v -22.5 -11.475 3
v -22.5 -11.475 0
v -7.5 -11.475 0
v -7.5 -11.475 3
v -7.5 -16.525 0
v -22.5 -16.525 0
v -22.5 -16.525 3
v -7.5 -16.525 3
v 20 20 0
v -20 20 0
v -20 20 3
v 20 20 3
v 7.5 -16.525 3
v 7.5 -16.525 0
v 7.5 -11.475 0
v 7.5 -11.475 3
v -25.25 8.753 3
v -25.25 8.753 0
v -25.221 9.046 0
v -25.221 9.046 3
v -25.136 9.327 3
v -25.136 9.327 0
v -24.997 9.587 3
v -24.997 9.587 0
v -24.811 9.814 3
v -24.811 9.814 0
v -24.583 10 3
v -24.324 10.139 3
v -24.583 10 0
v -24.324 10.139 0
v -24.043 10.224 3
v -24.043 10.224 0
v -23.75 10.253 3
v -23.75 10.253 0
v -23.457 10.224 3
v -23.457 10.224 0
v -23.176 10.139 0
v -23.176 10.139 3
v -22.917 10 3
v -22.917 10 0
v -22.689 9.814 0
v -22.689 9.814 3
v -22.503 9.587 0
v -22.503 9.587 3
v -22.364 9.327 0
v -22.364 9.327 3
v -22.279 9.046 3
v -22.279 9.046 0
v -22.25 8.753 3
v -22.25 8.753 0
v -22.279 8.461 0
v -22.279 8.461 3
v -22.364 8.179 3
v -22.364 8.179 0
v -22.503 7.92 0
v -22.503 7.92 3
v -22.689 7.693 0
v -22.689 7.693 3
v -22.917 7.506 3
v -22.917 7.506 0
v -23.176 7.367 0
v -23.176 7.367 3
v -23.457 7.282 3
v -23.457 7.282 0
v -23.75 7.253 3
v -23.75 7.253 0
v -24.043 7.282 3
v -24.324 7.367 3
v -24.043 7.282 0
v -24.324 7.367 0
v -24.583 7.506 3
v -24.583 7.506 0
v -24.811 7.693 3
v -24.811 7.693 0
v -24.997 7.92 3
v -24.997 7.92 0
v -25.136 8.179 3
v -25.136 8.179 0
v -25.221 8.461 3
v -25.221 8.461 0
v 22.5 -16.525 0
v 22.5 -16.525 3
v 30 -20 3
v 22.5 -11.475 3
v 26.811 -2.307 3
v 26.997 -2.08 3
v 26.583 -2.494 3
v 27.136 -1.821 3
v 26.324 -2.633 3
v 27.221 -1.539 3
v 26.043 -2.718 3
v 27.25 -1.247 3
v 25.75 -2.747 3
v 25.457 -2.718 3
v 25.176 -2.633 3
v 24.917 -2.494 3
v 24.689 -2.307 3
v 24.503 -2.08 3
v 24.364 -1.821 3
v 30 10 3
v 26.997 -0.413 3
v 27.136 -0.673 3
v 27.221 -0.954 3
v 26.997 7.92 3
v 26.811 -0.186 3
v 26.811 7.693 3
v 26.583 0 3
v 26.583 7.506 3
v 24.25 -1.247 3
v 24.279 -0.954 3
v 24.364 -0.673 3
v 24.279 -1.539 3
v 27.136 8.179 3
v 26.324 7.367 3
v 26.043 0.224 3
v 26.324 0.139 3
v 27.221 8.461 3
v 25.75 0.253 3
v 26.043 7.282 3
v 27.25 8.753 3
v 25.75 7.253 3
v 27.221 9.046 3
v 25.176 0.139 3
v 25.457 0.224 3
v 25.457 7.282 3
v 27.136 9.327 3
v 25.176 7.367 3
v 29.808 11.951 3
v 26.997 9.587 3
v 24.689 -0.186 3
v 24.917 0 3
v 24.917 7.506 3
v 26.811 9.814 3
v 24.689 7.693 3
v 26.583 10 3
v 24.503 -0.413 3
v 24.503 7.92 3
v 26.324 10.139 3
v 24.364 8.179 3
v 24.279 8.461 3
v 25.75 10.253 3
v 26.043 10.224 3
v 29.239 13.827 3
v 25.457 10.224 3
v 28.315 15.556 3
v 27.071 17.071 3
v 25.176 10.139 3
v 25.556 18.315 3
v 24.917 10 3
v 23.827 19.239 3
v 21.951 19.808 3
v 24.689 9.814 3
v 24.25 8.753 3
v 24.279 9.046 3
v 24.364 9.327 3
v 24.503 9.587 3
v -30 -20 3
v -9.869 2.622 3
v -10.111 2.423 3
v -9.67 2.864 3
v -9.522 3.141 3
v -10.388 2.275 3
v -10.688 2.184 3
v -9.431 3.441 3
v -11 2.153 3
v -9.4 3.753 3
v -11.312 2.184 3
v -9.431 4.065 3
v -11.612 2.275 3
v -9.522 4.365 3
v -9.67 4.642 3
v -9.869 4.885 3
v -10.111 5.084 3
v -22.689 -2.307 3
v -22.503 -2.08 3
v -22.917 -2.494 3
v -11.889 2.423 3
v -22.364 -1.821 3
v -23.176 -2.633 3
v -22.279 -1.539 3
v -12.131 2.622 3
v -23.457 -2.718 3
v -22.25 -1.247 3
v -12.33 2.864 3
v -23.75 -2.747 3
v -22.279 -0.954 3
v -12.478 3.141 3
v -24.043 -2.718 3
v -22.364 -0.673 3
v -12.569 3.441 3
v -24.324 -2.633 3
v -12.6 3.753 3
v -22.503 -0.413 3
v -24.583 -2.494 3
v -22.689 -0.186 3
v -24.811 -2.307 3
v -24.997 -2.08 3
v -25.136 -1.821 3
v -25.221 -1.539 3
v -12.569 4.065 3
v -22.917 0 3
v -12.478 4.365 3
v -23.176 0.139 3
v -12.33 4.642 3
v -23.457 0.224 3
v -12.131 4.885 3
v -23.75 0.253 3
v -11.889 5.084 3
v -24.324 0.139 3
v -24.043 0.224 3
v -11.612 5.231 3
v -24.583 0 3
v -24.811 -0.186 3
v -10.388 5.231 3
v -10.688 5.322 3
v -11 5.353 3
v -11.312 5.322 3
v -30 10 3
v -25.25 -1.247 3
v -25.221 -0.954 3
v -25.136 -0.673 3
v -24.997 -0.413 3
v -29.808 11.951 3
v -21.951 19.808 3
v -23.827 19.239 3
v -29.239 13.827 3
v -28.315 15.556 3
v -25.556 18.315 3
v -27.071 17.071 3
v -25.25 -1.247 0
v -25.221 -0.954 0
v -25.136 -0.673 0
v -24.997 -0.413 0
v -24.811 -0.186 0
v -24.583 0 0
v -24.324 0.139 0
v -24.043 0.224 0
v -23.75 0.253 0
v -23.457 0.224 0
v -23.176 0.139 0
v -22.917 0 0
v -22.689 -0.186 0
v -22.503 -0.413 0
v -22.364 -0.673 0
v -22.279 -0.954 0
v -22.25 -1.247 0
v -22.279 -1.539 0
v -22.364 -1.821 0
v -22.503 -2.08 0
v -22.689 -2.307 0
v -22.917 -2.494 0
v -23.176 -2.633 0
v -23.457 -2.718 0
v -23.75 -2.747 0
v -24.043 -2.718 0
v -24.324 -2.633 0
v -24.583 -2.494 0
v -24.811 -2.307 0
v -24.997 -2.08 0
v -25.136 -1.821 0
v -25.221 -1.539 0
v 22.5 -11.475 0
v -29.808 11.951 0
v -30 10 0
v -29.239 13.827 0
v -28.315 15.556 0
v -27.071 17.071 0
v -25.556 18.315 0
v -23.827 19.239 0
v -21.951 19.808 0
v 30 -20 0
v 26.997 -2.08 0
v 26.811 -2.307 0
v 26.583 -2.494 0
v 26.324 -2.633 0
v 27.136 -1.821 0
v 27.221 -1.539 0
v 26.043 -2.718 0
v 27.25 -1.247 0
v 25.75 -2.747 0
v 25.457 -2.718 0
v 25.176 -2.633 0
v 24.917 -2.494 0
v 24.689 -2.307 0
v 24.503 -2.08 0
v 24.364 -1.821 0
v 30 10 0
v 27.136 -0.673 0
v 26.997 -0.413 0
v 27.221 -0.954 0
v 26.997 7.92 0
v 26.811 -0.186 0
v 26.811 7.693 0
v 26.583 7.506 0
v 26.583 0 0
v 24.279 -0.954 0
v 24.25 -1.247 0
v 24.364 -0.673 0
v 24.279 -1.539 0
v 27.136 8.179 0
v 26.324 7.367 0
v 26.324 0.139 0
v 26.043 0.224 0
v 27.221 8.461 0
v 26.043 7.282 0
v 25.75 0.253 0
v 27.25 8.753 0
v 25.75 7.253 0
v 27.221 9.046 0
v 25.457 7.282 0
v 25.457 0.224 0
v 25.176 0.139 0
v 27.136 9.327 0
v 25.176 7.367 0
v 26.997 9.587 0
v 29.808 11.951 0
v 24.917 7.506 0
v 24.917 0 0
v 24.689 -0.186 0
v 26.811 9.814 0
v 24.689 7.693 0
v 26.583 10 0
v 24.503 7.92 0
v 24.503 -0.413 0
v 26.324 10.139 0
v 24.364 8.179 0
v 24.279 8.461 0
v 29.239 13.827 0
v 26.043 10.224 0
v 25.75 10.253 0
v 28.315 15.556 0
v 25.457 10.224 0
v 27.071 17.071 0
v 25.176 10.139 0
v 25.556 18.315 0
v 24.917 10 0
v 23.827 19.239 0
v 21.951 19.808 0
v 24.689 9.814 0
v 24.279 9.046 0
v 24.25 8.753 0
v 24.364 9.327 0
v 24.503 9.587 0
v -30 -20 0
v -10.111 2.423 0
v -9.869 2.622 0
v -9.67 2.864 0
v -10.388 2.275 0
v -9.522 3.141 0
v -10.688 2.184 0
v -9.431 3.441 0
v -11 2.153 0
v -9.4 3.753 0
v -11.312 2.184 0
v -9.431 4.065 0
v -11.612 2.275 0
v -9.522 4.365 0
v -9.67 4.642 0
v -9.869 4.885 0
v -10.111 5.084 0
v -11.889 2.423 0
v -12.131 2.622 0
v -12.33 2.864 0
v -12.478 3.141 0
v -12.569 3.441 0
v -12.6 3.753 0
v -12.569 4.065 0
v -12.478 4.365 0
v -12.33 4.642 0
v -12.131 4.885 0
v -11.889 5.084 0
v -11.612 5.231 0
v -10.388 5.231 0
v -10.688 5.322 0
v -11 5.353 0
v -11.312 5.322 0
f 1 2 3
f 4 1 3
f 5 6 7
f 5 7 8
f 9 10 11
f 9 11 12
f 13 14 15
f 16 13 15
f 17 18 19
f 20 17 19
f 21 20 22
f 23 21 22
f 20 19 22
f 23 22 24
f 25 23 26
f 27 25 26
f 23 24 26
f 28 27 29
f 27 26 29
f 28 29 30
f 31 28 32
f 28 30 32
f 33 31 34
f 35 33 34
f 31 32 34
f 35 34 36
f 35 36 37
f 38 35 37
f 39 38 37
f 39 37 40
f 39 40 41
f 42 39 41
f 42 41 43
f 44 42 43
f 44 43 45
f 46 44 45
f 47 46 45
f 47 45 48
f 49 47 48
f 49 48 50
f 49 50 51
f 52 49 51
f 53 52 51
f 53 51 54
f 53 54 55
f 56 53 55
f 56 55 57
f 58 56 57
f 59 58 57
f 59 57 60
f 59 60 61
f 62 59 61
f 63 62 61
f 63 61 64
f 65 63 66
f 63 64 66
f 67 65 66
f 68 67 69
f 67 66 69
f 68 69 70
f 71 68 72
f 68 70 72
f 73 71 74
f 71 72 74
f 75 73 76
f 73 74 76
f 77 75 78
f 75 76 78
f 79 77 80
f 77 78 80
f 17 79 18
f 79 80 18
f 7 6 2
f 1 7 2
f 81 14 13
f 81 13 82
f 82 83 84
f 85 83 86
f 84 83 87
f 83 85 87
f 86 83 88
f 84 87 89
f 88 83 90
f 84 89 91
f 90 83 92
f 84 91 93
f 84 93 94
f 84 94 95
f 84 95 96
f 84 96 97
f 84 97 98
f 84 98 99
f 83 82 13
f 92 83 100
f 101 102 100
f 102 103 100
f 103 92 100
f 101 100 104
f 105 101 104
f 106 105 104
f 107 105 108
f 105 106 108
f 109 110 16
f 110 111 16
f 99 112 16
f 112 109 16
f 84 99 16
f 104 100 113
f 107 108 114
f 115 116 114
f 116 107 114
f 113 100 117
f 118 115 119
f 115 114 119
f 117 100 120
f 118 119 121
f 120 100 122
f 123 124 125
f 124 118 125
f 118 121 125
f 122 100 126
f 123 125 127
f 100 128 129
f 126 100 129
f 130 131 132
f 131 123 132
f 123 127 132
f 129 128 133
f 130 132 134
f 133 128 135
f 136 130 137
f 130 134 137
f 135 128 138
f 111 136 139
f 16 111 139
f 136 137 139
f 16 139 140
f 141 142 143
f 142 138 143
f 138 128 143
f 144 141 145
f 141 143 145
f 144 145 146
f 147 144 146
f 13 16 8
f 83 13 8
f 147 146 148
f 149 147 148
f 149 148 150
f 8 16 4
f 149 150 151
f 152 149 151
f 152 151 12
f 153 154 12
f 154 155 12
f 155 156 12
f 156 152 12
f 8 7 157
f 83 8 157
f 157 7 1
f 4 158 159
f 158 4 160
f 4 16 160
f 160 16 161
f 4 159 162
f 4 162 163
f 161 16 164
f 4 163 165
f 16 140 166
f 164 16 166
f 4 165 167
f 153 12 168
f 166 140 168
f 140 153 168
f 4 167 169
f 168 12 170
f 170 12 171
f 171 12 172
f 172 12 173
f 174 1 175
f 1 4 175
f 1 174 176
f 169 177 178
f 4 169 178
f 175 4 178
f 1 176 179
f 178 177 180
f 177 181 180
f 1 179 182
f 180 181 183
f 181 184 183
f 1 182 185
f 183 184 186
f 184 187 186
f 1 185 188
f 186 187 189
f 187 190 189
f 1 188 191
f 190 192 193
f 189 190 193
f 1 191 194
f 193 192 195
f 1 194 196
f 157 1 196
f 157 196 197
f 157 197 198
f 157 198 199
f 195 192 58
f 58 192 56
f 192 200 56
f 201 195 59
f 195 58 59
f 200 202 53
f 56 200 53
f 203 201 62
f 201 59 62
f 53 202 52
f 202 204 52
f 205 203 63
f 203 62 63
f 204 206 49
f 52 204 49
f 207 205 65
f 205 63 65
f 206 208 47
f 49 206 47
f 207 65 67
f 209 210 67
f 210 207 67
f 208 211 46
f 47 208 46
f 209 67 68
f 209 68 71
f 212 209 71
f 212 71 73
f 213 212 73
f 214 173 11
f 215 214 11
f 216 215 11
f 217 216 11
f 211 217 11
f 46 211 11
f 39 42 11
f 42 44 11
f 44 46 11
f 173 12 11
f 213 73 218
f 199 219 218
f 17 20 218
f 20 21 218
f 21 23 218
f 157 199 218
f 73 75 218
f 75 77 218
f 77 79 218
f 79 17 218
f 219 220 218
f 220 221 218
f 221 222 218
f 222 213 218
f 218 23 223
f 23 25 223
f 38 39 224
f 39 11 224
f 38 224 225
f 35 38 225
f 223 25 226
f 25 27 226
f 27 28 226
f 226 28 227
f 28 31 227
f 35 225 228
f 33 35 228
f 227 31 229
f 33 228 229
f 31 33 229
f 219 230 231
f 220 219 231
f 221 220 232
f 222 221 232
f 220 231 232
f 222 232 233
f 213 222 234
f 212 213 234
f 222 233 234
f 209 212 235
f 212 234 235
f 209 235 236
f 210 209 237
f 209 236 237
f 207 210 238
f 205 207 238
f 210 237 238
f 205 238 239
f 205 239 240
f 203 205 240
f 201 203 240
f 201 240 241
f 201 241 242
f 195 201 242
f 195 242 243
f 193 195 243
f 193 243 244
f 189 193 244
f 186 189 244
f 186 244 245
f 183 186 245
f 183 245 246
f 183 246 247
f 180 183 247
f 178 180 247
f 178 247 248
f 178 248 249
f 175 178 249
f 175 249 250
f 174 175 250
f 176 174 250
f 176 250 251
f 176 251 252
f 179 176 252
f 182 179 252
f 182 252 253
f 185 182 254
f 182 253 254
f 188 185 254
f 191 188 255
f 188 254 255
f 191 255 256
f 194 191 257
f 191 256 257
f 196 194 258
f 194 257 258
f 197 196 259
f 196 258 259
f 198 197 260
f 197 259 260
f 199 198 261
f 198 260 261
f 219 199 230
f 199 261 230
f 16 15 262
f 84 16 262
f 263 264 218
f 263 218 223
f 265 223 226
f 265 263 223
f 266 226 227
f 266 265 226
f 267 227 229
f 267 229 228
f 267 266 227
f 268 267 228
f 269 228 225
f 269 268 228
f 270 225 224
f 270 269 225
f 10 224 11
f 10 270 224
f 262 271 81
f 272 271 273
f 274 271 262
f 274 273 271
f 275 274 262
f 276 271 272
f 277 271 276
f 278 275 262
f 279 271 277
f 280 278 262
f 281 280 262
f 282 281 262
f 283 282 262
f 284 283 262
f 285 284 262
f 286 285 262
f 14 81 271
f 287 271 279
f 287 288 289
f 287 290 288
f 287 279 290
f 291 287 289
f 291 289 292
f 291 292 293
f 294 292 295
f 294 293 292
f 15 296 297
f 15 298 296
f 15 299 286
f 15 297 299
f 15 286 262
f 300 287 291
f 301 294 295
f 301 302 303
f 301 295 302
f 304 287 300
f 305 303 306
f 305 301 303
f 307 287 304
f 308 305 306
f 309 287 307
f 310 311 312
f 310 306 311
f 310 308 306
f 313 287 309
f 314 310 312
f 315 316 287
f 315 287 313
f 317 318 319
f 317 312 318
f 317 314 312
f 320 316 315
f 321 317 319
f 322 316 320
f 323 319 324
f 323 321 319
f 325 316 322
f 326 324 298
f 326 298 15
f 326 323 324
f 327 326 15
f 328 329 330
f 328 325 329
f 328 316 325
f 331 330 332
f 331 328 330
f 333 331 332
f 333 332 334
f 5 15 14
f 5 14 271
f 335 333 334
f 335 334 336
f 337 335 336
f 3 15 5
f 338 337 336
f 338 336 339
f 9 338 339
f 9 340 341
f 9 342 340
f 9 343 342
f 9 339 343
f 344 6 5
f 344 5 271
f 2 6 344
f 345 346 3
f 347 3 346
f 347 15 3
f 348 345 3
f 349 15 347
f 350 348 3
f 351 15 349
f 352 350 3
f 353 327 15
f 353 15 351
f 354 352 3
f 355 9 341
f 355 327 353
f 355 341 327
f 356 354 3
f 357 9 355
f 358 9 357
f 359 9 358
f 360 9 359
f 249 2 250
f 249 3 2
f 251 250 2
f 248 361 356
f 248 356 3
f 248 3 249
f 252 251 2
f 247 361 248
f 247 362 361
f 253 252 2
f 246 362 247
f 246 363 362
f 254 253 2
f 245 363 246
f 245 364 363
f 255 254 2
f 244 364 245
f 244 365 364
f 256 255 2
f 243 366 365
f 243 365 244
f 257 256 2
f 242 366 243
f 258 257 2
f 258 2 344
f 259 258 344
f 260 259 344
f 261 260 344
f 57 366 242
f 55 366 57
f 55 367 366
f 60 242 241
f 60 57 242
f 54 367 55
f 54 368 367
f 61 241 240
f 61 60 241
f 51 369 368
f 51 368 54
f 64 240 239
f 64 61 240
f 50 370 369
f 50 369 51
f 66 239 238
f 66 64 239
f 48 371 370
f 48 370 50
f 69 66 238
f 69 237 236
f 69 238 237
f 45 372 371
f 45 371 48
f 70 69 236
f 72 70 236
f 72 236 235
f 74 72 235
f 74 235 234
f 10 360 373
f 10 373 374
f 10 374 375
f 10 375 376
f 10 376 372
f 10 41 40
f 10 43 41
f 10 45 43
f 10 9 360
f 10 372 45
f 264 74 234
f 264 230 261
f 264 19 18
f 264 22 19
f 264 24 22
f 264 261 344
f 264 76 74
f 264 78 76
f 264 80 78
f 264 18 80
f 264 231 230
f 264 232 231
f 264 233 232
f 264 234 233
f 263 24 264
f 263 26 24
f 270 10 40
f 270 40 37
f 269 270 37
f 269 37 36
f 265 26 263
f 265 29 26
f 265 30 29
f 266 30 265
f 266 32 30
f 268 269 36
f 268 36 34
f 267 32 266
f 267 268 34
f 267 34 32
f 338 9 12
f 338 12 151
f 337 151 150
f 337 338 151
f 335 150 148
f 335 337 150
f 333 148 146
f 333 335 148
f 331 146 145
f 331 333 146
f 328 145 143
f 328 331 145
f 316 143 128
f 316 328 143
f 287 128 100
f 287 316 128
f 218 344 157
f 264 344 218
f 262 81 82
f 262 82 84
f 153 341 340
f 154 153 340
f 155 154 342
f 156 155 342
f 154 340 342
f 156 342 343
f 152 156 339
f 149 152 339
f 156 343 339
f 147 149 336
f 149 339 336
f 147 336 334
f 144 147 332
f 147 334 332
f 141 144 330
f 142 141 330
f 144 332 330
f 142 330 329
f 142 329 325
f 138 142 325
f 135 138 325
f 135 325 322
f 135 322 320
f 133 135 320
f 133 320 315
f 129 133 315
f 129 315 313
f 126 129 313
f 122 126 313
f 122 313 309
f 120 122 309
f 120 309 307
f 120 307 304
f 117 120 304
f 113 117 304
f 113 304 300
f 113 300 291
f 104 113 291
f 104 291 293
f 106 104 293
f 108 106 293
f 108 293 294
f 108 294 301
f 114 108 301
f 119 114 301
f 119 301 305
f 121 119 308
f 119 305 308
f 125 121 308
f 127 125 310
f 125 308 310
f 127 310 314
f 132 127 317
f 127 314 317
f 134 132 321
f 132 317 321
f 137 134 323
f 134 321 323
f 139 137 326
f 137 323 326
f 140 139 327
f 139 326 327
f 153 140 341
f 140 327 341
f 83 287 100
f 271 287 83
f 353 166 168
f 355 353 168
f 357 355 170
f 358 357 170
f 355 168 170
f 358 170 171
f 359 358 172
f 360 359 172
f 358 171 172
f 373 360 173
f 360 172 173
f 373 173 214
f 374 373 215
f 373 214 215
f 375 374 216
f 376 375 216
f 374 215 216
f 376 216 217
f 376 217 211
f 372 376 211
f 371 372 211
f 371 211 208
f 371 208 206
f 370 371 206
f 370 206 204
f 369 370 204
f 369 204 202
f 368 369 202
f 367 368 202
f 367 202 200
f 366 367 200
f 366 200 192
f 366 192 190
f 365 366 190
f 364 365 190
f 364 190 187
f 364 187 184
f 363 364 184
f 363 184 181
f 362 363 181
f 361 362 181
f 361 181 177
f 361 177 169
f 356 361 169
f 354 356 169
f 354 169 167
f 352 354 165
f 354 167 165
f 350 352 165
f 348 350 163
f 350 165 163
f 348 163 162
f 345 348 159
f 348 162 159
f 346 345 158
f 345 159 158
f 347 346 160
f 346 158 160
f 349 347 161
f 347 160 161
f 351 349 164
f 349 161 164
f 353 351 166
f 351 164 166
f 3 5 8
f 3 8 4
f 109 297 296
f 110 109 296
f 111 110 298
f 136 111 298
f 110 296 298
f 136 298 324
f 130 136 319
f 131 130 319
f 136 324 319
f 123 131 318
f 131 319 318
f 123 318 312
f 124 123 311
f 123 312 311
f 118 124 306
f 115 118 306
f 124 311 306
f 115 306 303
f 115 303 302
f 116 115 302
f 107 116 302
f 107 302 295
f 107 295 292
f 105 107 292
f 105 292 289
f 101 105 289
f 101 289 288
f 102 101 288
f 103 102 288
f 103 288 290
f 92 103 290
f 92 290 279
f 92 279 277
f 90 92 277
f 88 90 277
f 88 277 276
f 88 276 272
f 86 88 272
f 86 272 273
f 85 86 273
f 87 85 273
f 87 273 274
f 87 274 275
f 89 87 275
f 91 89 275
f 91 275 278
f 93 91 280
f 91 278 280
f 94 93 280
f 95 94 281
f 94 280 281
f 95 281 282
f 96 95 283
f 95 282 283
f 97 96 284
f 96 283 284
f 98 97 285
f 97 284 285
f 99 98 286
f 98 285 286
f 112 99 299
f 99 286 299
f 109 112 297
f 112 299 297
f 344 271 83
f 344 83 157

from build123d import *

# Parameters (mm, degrees)
ESQUISSE1_W             = 15
ESQUISSE1_H             = 5.05
BOSS_EXTRU_1_DEPTH      = 3
ESQUISSE2_R             = 7.5
ESQUISSE2_R_2           = 1.6
ENL_V_MAT_EXTRU_1_DEPTH = 37.18010503
ESQUISSE3_R             = 1.5
ENL_V_MAT_EXTRU_2_DEPTH = 37.18010503


with BuildPart() as part:
    # Esquisse1 → Boss.-Extru.1 (new body)
    with BuildSketch(Plane.XY):
        with BuildLine():
            Line((-20, 20), (20, 20))
            ThreePointArc((20, 20), (27.071067812, 17.071067812), (30, 10))
            Line((30, 10), (30, -20))
            Line((30, -20), (-30, -20))
            Line((-30, -20), (-30, 10))
            ThreePointArc((-30, 10), (-27.071067812, 17.071067812), (-20, 20))
        make_face()
        with Locations((15, -14)):
            Rectangle(ESQUISSE1_W, ESQUISSE1_H, mode=Mode.SUBTRACT)
        with Locations((-15, -14)):
            Rectangle(ESQUISSE1_W, ESQUISSE1_H, mode=Mode.SUBTRACT)
    extrude(amount=BOSS_EXTRU_1_DEPTH)

    # Esquisse2 → Enlèv. mat.-Extru.1 (cut, through all)
    with BuildSketch(Plane.XY.offset(3)):
        with Locations((11, -35.28215794)):
            Circle(ESQUISSE2_R)
        with Locations((-11, 3.753166138)):
            Circle(ESQUISSE2_R_2)
    extrude(amount=-ENL_V_MAT_EXTRU_1_DEPTH, mode=Mode.SUBTRACT)

    # Esquisse3 → Enlèv. mat.-Extru.2 (cut, through all)
    with BuildSketch(Plane(origin=(0, 0, 0), x_dir=(-1, 0, 0), z_dir=(0, 0, -1))):
        with Locations((-25.75, 8.753166138)):
            Circle(ESQUISSE3_R)
        with Locations((-25.75, -1.246833862)):
            Circle(ESQUISSE3_R)
        with Locations((23.75, 8.753166138)):
            Circle(ESQUISSE3_R)
        with Locations((23.75, -1.246833862)):
            Circle(ESQUISSE3_R)
    extrude(amount=-ENL_V_MAT_EXTRU_2_DEPTH, mode=Mode.SUBTRACT)


solid = part.part
